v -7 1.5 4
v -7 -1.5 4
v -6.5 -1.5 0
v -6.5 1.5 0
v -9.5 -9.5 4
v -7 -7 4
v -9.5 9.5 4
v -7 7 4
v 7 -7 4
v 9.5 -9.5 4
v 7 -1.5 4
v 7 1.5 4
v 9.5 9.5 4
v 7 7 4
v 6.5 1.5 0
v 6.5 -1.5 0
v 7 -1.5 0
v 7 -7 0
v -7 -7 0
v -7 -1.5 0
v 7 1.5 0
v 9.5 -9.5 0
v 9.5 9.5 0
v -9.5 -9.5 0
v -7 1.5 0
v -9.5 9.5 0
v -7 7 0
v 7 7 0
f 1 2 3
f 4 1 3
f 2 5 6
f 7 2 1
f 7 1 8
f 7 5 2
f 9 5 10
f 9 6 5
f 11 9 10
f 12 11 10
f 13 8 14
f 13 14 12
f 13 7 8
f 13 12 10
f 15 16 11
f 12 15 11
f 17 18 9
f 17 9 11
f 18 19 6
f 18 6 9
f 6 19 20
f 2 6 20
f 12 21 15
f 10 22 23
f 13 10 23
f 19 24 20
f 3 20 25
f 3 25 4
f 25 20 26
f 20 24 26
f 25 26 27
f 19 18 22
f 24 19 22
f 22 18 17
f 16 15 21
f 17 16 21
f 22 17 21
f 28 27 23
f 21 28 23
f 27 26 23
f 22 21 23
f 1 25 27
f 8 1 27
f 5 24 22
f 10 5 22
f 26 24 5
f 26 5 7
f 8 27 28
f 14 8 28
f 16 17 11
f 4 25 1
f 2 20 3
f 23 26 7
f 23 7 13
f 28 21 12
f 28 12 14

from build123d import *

# Parameters (mm, degrees)
F0_W     = 19
F0_H     = 19
F0_W_2   = 14
F0_H_2   = 14
F1_DEPTH = 4
F2_W     = 3
F2_H     = 4
F3_DEPTH = 0.5
F5_DEPTH = 3
F6_W     = 3
F6_H     = 4
F7_DEPTH = 0.5
F9_DEPTH = 3


with BuildPart() as f1:
    # F0 (on Top) → F1 (new body)
    with BuildSketch(Plane.XY):
        Rectangle(F0_W, F0_H)
        Rectangle(F0_W_2, F0_H_2, mode=Mode.SUBTRACT)
    extrude(amount=F1_DEPTH)

    # F2 (on face) → F3 (join)
    with BuildSketch(Plane.YZ.offset(-7)):
        with Locations((0, 2)):
            Rectangle(F2_W, F2_H)
    extrude(amount=F3_DEPTH)

    # F4 (on face) → F5 (cut, through all)
    with BuildSketch(Plane.XZ.offset(1.5)):
        Polygon((-6.5, 4), (-7, 4), (-6.5, 0), align=None)
    extrude(amount=-F5_DEPTH, mode=Mode.SUBTRACT)

    # F6 (on face) → F7 (join)
    with BuildSketch(Plane(origin=(7, 0, 0), x_dir=(0, -1, 0), z_dir=(-1, 0, 0))):
        with Locations((0, 2)):
            Rectangle(F6_W, F6_H)
    extrude(amount=F7_DEPTH)

    # F8 (on face) → F9 (cut, through all)
    with BuildSketch(Plane.XZ.offset(1.5)):
        Polygon((6.5, 4), (6.5, 0), (7, 4), align=None)
    extrude(amount=-F9_DEPTH, mode=Mode.SUBTRACT)


solid = f1.part
